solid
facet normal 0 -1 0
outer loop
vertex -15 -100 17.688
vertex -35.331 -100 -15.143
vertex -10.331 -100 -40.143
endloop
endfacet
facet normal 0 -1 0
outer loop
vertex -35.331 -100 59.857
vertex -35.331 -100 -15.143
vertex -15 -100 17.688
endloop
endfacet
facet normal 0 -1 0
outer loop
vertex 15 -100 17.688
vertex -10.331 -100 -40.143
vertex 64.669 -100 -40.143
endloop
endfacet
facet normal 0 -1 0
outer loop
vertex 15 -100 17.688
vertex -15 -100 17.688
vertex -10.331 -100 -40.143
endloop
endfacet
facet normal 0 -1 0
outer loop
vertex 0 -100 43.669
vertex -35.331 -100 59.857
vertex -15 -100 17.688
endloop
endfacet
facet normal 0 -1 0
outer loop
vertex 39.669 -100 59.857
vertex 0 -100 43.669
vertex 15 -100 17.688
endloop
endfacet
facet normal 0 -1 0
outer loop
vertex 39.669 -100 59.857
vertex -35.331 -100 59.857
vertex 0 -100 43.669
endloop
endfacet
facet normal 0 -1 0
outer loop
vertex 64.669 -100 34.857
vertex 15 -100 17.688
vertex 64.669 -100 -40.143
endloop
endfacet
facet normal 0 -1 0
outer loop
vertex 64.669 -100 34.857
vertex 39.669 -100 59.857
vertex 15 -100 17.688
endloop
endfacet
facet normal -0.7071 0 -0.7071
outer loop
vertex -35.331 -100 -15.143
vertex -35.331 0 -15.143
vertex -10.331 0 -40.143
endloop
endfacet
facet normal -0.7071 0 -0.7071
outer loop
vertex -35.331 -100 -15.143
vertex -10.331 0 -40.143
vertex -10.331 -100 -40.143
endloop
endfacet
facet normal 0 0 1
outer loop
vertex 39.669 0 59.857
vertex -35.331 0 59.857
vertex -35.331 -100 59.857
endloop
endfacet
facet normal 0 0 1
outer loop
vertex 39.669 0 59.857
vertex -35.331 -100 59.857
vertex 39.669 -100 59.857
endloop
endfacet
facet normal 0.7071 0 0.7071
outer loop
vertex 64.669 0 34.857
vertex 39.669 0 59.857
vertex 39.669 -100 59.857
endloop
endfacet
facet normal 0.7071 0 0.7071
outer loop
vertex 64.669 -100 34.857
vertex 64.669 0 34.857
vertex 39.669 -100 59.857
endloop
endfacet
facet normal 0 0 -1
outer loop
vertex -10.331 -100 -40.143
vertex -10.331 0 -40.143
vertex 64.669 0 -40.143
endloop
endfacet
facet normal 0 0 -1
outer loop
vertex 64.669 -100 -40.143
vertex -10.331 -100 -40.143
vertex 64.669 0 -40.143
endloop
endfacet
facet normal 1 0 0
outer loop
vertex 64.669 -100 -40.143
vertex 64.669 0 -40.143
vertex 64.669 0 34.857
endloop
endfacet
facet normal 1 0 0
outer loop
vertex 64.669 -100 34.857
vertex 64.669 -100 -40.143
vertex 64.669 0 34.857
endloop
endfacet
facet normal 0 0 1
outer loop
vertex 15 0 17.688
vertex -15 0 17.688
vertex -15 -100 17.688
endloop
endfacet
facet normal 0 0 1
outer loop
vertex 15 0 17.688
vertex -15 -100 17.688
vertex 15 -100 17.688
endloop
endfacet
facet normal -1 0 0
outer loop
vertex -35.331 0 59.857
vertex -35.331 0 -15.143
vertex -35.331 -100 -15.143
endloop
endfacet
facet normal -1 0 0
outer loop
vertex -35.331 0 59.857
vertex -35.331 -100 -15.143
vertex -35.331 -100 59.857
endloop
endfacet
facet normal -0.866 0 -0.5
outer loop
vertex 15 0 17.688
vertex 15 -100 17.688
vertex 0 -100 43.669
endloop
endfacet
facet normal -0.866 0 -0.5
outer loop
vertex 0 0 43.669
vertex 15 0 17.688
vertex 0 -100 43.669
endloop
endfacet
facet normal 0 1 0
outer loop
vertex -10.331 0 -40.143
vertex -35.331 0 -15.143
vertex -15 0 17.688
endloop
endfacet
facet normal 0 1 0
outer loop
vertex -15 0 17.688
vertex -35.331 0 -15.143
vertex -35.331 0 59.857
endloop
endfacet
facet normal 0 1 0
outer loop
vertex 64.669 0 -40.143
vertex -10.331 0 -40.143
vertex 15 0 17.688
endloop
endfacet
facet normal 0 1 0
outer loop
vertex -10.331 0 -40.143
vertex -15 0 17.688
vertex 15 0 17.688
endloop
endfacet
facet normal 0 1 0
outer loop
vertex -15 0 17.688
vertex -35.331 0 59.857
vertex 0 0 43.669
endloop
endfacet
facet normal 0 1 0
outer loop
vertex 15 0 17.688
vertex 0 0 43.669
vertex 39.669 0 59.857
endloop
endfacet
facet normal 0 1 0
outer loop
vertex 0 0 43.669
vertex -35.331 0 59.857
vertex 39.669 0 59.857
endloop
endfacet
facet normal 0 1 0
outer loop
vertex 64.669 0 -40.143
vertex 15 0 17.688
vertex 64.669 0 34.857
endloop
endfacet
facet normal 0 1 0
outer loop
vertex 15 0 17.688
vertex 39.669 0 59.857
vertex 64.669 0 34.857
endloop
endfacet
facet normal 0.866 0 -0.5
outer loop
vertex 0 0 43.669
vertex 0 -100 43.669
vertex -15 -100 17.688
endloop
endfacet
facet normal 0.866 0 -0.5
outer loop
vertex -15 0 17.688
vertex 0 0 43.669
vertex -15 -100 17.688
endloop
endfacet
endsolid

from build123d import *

# Parameters (mm, degrees)
F0_W     = 100
F0_H     = 100
F1_DEPTH = 100
F3_SIZE  = 25
F4_SIZE  = 25
F5_DEPTH = 100


with BuildPart() as f1:
    # F0 (on Front) → F1 (new body)
    with BuildSketch(Plane.XZ):
        with Locations((14.669374, 9.856632)):
            Rectangle(F0_W, F0_H)
    extrude(amount=F1_DEPTH)

    # F3
    f3_edges = [f1.edges().sort_by_distance(p)[0] for p in [
        (64.669374, -50, 59.856632),
    ]]
    chamfer(f3_edges, length=F3_SIZE)

    # F4
    f4_edges = [f1.edges().sort_by_distance(p)[0] for p in [
        (-35.330626, -50, -40.143368),
    ]]
    chamfer(f4_edges, length=F4_SIZE)

    # F2 (on face) → F5 (cut)
    with BuildSketch(Plane.XZ.offset(100)):
        Polygon((15, 17.688339), (0, 43.669101), (-15, 17.688339), align=None)
    extrude(amount=-F5_DEPTH, mode=Mode.SUBTRACT)


solid = f1.part
